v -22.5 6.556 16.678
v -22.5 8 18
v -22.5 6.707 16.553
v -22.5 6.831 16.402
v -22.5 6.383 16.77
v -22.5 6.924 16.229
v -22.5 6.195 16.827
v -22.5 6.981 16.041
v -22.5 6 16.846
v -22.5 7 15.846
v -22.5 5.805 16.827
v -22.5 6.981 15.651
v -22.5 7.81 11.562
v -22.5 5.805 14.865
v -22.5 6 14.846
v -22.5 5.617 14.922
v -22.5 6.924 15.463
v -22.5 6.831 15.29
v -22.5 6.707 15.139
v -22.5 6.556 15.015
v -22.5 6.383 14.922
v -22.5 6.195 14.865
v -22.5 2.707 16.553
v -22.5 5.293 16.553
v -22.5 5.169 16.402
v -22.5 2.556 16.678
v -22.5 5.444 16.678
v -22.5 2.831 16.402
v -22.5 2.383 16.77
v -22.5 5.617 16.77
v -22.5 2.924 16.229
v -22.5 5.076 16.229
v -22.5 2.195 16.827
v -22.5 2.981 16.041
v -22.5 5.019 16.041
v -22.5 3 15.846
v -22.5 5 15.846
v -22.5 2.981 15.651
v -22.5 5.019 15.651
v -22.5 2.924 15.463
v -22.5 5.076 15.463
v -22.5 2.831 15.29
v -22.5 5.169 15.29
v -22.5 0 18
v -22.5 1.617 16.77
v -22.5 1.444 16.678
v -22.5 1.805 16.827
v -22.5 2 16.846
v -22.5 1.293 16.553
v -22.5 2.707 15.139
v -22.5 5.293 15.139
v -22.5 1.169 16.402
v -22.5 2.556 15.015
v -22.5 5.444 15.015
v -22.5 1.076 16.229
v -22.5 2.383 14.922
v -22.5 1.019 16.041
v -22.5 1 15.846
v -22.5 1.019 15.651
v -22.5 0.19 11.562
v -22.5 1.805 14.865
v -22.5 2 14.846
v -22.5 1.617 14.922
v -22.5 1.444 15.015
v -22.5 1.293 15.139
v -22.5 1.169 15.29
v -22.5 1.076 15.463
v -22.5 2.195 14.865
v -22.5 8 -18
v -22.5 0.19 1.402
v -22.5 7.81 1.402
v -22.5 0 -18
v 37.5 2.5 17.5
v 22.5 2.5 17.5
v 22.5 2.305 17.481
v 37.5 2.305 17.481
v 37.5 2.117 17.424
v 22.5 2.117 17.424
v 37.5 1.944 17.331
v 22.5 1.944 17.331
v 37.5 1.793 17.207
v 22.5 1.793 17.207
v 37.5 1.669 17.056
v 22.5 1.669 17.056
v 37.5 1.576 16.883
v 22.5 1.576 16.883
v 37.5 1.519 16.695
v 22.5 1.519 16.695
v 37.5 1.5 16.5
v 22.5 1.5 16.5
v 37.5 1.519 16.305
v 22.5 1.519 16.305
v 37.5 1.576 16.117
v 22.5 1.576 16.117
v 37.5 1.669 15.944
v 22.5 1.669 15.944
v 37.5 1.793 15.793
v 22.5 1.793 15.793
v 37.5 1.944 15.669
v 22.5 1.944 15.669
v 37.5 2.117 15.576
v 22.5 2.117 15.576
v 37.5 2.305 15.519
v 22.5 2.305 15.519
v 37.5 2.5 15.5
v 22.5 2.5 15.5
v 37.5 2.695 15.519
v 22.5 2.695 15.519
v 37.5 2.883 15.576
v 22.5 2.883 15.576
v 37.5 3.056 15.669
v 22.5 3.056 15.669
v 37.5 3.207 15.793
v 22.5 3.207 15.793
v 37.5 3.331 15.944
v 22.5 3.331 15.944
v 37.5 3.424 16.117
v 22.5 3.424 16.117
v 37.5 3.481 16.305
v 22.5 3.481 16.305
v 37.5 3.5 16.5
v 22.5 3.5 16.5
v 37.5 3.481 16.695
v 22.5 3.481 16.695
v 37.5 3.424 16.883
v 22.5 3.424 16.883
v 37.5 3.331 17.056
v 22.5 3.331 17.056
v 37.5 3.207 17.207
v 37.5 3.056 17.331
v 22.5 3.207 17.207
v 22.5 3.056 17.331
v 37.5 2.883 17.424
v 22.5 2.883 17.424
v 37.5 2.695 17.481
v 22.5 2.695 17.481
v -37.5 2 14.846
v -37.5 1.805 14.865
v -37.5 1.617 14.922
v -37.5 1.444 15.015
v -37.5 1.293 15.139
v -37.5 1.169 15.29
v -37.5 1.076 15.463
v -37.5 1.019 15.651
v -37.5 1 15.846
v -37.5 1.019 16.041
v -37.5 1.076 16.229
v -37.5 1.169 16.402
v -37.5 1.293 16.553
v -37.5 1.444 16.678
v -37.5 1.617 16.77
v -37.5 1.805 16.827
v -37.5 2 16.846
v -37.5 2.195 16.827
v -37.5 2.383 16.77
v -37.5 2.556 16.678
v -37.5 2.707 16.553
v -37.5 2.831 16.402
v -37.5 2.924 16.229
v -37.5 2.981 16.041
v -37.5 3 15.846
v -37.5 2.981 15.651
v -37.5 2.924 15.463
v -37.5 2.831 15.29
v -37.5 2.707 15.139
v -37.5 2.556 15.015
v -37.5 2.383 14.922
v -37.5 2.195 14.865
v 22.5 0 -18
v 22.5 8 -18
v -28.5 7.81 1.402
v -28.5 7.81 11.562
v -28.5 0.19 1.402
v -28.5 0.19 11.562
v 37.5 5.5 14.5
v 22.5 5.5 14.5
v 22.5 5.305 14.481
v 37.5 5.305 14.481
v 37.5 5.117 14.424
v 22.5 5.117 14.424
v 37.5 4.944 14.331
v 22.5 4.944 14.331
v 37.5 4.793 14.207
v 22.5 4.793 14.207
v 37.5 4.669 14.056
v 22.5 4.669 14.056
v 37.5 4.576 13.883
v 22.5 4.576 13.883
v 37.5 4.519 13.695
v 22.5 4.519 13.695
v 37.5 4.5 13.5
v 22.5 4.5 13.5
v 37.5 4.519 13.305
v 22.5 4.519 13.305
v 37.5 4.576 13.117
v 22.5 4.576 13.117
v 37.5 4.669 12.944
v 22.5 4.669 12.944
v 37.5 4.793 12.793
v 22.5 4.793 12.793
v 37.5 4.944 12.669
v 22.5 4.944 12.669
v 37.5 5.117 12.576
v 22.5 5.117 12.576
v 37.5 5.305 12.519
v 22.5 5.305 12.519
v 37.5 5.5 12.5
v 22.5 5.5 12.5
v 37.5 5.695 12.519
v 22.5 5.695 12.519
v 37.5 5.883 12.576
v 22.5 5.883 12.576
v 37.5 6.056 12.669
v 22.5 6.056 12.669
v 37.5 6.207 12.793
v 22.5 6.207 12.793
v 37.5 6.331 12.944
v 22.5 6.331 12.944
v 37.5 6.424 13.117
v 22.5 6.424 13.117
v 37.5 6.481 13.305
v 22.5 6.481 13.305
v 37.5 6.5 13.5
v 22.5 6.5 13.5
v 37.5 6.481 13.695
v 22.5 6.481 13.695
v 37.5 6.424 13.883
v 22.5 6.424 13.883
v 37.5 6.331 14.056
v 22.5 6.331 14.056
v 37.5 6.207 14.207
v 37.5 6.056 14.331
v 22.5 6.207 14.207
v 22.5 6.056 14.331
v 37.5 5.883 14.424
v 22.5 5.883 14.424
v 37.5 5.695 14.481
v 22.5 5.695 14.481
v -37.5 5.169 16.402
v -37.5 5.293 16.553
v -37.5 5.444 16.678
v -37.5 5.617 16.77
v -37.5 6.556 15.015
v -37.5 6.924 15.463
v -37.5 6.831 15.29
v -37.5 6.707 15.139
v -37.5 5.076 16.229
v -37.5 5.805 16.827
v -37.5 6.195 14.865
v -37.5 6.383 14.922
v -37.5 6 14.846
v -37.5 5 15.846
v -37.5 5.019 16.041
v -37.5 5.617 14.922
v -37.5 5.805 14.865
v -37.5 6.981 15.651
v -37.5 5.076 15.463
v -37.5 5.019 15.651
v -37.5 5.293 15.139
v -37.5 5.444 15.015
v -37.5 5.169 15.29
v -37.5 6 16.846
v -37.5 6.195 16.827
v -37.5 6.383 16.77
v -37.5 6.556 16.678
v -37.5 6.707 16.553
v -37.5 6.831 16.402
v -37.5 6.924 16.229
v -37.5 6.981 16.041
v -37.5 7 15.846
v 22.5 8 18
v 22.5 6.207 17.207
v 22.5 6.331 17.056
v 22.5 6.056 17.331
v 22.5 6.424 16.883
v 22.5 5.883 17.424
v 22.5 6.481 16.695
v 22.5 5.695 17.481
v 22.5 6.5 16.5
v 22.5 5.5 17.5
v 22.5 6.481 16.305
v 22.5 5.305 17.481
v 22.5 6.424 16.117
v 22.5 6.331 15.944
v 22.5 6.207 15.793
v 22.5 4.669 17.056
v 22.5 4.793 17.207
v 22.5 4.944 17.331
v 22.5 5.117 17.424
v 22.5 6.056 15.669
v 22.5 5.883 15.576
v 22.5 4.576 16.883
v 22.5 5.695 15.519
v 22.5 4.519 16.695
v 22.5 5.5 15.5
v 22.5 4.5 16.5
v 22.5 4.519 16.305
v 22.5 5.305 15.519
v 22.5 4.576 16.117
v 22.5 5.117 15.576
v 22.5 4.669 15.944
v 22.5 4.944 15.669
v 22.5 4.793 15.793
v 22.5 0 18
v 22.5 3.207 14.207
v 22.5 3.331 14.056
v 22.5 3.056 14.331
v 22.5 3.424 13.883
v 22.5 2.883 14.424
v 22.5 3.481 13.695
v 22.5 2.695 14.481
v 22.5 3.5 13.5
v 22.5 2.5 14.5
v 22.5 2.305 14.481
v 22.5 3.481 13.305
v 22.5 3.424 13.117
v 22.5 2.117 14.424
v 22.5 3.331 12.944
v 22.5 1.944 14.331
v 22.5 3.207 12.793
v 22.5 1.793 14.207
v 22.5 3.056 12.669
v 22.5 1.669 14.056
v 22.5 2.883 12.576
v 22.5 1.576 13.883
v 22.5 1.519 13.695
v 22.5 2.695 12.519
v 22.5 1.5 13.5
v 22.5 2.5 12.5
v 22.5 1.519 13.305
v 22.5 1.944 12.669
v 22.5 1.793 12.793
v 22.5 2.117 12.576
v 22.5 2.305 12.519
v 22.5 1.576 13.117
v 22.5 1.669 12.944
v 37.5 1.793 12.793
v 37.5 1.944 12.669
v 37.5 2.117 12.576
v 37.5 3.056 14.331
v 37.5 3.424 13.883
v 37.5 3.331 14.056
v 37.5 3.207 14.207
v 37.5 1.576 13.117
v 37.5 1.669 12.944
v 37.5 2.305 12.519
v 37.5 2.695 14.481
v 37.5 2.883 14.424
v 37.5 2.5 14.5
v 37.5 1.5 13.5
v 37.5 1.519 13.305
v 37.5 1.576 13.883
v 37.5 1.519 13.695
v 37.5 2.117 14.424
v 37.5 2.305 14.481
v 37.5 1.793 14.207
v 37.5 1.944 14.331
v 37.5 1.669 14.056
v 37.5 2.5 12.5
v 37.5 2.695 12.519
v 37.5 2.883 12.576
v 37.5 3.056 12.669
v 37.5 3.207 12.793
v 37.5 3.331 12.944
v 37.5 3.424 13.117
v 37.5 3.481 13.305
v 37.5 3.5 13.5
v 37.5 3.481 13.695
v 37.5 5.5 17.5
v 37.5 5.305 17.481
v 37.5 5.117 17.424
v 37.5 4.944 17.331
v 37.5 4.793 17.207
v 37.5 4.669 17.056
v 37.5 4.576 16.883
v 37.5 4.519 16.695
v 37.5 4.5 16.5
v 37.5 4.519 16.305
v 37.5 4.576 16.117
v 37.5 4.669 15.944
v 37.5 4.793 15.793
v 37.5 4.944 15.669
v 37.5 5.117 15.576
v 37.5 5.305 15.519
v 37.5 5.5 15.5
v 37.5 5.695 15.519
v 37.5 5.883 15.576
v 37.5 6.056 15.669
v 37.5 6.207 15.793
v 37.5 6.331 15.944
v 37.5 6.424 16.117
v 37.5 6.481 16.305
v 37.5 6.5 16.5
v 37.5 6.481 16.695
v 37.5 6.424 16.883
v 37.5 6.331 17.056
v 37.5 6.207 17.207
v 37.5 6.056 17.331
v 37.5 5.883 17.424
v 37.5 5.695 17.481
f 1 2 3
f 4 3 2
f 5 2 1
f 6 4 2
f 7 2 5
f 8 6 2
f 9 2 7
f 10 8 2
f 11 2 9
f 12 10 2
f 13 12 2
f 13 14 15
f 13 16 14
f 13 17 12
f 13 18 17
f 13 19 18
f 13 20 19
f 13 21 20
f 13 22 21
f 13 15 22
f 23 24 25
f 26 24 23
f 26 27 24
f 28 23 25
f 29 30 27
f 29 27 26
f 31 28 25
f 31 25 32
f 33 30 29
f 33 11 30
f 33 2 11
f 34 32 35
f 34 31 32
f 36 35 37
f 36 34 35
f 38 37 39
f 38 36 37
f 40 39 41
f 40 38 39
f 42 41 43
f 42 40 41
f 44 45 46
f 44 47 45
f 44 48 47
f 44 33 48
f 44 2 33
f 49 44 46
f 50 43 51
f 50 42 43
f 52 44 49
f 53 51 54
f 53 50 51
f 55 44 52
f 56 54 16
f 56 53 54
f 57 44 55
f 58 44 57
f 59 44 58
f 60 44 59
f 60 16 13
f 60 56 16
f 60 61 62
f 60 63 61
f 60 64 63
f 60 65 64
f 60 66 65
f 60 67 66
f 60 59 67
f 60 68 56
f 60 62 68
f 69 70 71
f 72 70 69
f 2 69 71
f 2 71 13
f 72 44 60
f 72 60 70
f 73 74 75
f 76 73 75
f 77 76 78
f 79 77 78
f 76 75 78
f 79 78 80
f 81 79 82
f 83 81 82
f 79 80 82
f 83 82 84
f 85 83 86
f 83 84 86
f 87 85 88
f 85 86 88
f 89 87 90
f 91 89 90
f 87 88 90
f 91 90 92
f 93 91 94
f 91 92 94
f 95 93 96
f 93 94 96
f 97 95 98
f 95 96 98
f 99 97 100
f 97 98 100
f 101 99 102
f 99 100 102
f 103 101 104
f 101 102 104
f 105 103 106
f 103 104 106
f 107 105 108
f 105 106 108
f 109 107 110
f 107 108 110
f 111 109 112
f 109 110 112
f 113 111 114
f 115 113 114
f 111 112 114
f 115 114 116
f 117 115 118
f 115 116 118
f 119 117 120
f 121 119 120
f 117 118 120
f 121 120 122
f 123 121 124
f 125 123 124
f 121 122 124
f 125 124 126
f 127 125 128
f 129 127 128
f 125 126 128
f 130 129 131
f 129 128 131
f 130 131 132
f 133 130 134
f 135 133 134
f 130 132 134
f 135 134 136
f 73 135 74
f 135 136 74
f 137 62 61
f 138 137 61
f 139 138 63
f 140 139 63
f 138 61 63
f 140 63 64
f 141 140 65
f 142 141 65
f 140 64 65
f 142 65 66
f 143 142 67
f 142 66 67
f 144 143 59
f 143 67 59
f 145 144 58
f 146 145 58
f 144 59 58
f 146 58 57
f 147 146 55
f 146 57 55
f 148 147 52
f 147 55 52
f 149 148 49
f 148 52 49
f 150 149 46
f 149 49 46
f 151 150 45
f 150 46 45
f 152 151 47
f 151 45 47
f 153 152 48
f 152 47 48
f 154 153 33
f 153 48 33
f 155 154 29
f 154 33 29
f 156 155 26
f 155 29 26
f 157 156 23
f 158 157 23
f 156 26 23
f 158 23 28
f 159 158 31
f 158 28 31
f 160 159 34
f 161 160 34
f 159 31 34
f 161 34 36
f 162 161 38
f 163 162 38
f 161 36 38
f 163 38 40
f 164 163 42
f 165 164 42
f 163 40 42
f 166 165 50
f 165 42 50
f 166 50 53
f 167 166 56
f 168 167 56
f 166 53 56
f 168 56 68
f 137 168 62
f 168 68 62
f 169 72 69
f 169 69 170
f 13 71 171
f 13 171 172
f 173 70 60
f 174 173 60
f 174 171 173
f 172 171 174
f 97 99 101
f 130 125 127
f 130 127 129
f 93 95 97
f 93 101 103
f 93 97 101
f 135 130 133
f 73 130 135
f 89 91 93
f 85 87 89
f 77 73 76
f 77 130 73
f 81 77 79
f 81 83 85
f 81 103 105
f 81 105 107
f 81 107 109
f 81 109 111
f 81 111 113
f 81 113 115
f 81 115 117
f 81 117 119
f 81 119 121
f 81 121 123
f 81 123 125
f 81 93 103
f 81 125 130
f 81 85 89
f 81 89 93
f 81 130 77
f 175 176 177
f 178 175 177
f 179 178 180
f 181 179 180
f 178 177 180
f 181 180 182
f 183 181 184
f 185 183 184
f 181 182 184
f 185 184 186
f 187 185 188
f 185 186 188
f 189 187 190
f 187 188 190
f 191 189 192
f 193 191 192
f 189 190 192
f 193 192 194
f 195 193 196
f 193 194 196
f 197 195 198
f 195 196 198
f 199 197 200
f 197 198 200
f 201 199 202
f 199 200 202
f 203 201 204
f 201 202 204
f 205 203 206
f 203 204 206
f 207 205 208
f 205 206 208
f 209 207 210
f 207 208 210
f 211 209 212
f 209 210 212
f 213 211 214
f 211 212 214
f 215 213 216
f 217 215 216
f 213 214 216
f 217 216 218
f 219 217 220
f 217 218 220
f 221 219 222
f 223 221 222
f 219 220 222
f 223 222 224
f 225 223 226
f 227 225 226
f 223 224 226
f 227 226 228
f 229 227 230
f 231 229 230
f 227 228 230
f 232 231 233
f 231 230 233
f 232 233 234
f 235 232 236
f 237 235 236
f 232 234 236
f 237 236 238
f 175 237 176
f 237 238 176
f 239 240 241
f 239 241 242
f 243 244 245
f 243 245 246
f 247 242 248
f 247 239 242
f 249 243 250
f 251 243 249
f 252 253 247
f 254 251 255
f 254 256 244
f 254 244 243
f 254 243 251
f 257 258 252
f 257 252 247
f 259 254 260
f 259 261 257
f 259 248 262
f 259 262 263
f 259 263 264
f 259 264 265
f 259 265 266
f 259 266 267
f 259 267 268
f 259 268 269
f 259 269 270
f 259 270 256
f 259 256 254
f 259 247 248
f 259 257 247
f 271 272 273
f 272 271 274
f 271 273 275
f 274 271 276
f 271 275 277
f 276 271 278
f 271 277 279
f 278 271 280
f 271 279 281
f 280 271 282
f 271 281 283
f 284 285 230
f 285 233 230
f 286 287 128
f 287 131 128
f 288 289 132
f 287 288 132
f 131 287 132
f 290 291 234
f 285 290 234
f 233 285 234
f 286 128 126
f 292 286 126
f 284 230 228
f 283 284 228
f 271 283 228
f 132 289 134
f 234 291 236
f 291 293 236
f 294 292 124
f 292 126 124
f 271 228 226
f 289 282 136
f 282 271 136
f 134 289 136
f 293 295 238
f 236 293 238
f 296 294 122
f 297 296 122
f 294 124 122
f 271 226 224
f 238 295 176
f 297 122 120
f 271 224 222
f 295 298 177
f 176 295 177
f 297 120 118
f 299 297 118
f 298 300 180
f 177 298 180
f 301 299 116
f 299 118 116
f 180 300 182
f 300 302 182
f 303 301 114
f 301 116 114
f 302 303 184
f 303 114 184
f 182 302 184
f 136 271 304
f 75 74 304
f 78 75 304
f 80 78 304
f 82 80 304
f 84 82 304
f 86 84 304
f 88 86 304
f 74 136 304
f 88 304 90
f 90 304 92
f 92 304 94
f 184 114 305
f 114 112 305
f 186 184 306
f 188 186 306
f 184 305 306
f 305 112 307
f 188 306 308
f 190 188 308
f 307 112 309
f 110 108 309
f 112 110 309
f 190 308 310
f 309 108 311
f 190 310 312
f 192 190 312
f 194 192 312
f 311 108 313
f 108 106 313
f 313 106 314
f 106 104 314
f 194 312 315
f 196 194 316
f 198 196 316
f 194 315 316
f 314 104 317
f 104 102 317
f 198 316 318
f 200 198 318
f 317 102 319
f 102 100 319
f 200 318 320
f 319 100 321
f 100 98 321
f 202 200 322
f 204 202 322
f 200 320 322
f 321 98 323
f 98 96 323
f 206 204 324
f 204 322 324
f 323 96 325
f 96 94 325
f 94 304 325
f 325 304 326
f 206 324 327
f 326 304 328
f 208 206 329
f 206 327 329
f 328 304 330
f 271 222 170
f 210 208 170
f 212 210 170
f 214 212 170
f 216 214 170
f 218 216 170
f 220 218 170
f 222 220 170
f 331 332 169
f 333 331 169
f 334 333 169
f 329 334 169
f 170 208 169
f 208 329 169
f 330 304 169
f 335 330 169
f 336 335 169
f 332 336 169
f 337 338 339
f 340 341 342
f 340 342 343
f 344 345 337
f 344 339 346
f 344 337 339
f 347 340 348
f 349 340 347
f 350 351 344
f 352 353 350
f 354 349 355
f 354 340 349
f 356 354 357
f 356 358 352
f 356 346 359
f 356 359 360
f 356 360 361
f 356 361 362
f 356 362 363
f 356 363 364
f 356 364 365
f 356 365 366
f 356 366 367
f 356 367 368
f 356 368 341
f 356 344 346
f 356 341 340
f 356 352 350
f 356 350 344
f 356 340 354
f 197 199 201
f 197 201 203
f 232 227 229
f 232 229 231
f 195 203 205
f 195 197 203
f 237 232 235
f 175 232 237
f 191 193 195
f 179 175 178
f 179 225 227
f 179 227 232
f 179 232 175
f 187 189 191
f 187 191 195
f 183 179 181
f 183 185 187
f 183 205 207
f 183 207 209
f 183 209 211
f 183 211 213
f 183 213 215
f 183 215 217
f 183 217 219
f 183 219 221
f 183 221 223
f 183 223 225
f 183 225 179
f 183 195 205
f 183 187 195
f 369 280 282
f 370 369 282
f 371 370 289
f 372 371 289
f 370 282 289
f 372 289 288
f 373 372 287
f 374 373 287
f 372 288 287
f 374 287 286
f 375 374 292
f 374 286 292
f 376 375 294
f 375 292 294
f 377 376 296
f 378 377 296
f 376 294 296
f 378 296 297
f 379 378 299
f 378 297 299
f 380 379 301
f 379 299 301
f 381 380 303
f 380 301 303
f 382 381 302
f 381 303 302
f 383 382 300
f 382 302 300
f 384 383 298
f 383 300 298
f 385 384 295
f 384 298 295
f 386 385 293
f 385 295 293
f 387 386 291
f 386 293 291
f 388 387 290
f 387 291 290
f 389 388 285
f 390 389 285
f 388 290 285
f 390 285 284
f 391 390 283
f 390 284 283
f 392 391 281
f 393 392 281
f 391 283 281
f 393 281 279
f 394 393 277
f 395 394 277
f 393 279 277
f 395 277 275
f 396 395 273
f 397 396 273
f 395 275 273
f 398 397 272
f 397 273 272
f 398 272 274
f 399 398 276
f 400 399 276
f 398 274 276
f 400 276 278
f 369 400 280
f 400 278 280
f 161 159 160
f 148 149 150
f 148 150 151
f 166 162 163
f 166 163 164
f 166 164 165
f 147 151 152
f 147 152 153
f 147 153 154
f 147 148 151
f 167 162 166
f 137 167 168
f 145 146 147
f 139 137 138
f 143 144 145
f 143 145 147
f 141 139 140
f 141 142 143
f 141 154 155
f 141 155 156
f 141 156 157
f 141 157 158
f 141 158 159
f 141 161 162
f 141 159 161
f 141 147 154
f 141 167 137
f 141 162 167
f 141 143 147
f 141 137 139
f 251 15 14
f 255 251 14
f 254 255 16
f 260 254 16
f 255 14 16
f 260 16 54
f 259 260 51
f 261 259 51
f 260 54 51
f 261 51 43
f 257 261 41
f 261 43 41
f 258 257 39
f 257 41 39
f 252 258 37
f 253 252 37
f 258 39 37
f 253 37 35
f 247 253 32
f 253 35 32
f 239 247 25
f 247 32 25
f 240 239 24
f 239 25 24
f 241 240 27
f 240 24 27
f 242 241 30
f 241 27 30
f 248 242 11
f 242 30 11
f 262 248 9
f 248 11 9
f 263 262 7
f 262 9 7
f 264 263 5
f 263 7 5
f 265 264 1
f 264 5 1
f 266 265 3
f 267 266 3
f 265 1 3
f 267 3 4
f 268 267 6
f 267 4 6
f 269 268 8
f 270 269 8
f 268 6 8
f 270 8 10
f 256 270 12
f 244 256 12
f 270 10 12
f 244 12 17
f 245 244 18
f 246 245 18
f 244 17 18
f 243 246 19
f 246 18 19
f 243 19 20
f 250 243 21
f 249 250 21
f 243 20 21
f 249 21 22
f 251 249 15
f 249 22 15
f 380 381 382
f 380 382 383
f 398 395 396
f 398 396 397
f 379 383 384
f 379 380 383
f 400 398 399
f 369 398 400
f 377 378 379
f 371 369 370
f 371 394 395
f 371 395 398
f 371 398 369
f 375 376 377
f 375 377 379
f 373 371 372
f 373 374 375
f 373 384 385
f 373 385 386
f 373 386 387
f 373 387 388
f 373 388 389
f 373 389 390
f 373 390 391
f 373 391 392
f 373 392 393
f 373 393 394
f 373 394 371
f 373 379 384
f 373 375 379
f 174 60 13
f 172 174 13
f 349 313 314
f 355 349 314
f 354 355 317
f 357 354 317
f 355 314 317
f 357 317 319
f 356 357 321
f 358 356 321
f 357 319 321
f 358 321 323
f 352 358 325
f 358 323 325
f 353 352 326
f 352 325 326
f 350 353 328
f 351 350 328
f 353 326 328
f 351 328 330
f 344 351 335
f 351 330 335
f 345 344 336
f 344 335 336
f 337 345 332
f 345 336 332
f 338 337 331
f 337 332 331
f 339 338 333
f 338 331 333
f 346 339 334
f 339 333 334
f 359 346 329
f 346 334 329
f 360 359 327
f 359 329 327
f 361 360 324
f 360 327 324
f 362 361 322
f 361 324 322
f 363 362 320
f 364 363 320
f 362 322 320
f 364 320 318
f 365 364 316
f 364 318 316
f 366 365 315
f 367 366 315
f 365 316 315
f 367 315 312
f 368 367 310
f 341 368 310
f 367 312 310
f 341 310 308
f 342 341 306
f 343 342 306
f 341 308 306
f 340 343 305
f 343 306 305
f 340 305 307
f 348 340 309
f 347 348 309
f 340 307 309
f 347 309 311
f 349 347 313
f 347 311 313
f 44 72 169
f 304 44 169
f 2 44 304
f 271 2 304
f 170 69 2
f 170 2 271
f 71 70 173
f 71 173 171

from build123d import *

# Parameters (mm, degrees)
ESQUISSE1_W        = 45
ESQUISSE1_H        = 36
BOSS_EXTRU_1_DEPTH = 8
ESQUISSE2_W        = 10.16
ESQUISSE2_H        = 7.62
BOSS_EXTRU_2_DEPTH = 6
ESQUISSE3_R        = 1
BOSS_EXTRU_3_DEPTH = 15
ESQUISSE4_R        = 1
BOSS_EXTRU_4_DEPTH = 15


with BuildPart() as part:
    # Esquisse1 → Boss.-Extru.1 (new body)
    with BuildSketch(Plane(origin=(0, 0, 0), x_dir=(1, 0, 0), z_dir=(0, 1, 0))):
        Rectangle(ESQUISSE1_W, ESQUISSE1_H)
    extrude(amount=BOSS_EXTRU_1_DEPTH)

    # Esquisse2 → Boss.-Extru.2 (add)
    with BuildSketch(Plane.ZY.offset(22.5)):
        with Locations((6.482241764, 4)):
            Rectangle(ESQUISSE2_W, ESQUISSE2_H)
    extrude(amount=BOSS_EXTRU_2_DEPTH)

    # Esquisse3 → Boss.-Extru.3 (add)
    with BuildSketch(Plane.ZY.offset(22.5)):
        with Locations(Location((15.846041743, 6, 0), (0, 0, 180))):
            Circle(ESQUISSE3_R)
        with Locations(Location((15.846041743, 2, 0), (0, 0, 180))):
            Circle(ESQUISSE3_R)
    extrude(amount=BOSS_EXTRU_3_DEPTH)

    # Esquisse4 → Boss.-Extru.4 (add)
    with BuildSketch(Plane(origin=(22.5, 0, 0), x_dir=(0, 0, -1), z_dir=(1, 0, 0))):
        with Locations(Location((-16.5, 5.5, 0), (0, 0, 180))):
            Circle(ESQUISSE4_R)
        with Locations(Location((-16.5, 2.5, 0), (0, 0, 180))):
            Circle(ESQUISSE4_R)
        with Locations(Location((-13.5, 2.5, 0), (0, 0, 180))):
            Circle(ESQUISSE4_R)
        with Locations(Location((-13.5, 5.5, 0), (0, 0, 180))):
            Circle(ESQUISSE4_R)
    extrude(amount=BOSS_EXTRU_4_DEPTH)


solid = part.part
